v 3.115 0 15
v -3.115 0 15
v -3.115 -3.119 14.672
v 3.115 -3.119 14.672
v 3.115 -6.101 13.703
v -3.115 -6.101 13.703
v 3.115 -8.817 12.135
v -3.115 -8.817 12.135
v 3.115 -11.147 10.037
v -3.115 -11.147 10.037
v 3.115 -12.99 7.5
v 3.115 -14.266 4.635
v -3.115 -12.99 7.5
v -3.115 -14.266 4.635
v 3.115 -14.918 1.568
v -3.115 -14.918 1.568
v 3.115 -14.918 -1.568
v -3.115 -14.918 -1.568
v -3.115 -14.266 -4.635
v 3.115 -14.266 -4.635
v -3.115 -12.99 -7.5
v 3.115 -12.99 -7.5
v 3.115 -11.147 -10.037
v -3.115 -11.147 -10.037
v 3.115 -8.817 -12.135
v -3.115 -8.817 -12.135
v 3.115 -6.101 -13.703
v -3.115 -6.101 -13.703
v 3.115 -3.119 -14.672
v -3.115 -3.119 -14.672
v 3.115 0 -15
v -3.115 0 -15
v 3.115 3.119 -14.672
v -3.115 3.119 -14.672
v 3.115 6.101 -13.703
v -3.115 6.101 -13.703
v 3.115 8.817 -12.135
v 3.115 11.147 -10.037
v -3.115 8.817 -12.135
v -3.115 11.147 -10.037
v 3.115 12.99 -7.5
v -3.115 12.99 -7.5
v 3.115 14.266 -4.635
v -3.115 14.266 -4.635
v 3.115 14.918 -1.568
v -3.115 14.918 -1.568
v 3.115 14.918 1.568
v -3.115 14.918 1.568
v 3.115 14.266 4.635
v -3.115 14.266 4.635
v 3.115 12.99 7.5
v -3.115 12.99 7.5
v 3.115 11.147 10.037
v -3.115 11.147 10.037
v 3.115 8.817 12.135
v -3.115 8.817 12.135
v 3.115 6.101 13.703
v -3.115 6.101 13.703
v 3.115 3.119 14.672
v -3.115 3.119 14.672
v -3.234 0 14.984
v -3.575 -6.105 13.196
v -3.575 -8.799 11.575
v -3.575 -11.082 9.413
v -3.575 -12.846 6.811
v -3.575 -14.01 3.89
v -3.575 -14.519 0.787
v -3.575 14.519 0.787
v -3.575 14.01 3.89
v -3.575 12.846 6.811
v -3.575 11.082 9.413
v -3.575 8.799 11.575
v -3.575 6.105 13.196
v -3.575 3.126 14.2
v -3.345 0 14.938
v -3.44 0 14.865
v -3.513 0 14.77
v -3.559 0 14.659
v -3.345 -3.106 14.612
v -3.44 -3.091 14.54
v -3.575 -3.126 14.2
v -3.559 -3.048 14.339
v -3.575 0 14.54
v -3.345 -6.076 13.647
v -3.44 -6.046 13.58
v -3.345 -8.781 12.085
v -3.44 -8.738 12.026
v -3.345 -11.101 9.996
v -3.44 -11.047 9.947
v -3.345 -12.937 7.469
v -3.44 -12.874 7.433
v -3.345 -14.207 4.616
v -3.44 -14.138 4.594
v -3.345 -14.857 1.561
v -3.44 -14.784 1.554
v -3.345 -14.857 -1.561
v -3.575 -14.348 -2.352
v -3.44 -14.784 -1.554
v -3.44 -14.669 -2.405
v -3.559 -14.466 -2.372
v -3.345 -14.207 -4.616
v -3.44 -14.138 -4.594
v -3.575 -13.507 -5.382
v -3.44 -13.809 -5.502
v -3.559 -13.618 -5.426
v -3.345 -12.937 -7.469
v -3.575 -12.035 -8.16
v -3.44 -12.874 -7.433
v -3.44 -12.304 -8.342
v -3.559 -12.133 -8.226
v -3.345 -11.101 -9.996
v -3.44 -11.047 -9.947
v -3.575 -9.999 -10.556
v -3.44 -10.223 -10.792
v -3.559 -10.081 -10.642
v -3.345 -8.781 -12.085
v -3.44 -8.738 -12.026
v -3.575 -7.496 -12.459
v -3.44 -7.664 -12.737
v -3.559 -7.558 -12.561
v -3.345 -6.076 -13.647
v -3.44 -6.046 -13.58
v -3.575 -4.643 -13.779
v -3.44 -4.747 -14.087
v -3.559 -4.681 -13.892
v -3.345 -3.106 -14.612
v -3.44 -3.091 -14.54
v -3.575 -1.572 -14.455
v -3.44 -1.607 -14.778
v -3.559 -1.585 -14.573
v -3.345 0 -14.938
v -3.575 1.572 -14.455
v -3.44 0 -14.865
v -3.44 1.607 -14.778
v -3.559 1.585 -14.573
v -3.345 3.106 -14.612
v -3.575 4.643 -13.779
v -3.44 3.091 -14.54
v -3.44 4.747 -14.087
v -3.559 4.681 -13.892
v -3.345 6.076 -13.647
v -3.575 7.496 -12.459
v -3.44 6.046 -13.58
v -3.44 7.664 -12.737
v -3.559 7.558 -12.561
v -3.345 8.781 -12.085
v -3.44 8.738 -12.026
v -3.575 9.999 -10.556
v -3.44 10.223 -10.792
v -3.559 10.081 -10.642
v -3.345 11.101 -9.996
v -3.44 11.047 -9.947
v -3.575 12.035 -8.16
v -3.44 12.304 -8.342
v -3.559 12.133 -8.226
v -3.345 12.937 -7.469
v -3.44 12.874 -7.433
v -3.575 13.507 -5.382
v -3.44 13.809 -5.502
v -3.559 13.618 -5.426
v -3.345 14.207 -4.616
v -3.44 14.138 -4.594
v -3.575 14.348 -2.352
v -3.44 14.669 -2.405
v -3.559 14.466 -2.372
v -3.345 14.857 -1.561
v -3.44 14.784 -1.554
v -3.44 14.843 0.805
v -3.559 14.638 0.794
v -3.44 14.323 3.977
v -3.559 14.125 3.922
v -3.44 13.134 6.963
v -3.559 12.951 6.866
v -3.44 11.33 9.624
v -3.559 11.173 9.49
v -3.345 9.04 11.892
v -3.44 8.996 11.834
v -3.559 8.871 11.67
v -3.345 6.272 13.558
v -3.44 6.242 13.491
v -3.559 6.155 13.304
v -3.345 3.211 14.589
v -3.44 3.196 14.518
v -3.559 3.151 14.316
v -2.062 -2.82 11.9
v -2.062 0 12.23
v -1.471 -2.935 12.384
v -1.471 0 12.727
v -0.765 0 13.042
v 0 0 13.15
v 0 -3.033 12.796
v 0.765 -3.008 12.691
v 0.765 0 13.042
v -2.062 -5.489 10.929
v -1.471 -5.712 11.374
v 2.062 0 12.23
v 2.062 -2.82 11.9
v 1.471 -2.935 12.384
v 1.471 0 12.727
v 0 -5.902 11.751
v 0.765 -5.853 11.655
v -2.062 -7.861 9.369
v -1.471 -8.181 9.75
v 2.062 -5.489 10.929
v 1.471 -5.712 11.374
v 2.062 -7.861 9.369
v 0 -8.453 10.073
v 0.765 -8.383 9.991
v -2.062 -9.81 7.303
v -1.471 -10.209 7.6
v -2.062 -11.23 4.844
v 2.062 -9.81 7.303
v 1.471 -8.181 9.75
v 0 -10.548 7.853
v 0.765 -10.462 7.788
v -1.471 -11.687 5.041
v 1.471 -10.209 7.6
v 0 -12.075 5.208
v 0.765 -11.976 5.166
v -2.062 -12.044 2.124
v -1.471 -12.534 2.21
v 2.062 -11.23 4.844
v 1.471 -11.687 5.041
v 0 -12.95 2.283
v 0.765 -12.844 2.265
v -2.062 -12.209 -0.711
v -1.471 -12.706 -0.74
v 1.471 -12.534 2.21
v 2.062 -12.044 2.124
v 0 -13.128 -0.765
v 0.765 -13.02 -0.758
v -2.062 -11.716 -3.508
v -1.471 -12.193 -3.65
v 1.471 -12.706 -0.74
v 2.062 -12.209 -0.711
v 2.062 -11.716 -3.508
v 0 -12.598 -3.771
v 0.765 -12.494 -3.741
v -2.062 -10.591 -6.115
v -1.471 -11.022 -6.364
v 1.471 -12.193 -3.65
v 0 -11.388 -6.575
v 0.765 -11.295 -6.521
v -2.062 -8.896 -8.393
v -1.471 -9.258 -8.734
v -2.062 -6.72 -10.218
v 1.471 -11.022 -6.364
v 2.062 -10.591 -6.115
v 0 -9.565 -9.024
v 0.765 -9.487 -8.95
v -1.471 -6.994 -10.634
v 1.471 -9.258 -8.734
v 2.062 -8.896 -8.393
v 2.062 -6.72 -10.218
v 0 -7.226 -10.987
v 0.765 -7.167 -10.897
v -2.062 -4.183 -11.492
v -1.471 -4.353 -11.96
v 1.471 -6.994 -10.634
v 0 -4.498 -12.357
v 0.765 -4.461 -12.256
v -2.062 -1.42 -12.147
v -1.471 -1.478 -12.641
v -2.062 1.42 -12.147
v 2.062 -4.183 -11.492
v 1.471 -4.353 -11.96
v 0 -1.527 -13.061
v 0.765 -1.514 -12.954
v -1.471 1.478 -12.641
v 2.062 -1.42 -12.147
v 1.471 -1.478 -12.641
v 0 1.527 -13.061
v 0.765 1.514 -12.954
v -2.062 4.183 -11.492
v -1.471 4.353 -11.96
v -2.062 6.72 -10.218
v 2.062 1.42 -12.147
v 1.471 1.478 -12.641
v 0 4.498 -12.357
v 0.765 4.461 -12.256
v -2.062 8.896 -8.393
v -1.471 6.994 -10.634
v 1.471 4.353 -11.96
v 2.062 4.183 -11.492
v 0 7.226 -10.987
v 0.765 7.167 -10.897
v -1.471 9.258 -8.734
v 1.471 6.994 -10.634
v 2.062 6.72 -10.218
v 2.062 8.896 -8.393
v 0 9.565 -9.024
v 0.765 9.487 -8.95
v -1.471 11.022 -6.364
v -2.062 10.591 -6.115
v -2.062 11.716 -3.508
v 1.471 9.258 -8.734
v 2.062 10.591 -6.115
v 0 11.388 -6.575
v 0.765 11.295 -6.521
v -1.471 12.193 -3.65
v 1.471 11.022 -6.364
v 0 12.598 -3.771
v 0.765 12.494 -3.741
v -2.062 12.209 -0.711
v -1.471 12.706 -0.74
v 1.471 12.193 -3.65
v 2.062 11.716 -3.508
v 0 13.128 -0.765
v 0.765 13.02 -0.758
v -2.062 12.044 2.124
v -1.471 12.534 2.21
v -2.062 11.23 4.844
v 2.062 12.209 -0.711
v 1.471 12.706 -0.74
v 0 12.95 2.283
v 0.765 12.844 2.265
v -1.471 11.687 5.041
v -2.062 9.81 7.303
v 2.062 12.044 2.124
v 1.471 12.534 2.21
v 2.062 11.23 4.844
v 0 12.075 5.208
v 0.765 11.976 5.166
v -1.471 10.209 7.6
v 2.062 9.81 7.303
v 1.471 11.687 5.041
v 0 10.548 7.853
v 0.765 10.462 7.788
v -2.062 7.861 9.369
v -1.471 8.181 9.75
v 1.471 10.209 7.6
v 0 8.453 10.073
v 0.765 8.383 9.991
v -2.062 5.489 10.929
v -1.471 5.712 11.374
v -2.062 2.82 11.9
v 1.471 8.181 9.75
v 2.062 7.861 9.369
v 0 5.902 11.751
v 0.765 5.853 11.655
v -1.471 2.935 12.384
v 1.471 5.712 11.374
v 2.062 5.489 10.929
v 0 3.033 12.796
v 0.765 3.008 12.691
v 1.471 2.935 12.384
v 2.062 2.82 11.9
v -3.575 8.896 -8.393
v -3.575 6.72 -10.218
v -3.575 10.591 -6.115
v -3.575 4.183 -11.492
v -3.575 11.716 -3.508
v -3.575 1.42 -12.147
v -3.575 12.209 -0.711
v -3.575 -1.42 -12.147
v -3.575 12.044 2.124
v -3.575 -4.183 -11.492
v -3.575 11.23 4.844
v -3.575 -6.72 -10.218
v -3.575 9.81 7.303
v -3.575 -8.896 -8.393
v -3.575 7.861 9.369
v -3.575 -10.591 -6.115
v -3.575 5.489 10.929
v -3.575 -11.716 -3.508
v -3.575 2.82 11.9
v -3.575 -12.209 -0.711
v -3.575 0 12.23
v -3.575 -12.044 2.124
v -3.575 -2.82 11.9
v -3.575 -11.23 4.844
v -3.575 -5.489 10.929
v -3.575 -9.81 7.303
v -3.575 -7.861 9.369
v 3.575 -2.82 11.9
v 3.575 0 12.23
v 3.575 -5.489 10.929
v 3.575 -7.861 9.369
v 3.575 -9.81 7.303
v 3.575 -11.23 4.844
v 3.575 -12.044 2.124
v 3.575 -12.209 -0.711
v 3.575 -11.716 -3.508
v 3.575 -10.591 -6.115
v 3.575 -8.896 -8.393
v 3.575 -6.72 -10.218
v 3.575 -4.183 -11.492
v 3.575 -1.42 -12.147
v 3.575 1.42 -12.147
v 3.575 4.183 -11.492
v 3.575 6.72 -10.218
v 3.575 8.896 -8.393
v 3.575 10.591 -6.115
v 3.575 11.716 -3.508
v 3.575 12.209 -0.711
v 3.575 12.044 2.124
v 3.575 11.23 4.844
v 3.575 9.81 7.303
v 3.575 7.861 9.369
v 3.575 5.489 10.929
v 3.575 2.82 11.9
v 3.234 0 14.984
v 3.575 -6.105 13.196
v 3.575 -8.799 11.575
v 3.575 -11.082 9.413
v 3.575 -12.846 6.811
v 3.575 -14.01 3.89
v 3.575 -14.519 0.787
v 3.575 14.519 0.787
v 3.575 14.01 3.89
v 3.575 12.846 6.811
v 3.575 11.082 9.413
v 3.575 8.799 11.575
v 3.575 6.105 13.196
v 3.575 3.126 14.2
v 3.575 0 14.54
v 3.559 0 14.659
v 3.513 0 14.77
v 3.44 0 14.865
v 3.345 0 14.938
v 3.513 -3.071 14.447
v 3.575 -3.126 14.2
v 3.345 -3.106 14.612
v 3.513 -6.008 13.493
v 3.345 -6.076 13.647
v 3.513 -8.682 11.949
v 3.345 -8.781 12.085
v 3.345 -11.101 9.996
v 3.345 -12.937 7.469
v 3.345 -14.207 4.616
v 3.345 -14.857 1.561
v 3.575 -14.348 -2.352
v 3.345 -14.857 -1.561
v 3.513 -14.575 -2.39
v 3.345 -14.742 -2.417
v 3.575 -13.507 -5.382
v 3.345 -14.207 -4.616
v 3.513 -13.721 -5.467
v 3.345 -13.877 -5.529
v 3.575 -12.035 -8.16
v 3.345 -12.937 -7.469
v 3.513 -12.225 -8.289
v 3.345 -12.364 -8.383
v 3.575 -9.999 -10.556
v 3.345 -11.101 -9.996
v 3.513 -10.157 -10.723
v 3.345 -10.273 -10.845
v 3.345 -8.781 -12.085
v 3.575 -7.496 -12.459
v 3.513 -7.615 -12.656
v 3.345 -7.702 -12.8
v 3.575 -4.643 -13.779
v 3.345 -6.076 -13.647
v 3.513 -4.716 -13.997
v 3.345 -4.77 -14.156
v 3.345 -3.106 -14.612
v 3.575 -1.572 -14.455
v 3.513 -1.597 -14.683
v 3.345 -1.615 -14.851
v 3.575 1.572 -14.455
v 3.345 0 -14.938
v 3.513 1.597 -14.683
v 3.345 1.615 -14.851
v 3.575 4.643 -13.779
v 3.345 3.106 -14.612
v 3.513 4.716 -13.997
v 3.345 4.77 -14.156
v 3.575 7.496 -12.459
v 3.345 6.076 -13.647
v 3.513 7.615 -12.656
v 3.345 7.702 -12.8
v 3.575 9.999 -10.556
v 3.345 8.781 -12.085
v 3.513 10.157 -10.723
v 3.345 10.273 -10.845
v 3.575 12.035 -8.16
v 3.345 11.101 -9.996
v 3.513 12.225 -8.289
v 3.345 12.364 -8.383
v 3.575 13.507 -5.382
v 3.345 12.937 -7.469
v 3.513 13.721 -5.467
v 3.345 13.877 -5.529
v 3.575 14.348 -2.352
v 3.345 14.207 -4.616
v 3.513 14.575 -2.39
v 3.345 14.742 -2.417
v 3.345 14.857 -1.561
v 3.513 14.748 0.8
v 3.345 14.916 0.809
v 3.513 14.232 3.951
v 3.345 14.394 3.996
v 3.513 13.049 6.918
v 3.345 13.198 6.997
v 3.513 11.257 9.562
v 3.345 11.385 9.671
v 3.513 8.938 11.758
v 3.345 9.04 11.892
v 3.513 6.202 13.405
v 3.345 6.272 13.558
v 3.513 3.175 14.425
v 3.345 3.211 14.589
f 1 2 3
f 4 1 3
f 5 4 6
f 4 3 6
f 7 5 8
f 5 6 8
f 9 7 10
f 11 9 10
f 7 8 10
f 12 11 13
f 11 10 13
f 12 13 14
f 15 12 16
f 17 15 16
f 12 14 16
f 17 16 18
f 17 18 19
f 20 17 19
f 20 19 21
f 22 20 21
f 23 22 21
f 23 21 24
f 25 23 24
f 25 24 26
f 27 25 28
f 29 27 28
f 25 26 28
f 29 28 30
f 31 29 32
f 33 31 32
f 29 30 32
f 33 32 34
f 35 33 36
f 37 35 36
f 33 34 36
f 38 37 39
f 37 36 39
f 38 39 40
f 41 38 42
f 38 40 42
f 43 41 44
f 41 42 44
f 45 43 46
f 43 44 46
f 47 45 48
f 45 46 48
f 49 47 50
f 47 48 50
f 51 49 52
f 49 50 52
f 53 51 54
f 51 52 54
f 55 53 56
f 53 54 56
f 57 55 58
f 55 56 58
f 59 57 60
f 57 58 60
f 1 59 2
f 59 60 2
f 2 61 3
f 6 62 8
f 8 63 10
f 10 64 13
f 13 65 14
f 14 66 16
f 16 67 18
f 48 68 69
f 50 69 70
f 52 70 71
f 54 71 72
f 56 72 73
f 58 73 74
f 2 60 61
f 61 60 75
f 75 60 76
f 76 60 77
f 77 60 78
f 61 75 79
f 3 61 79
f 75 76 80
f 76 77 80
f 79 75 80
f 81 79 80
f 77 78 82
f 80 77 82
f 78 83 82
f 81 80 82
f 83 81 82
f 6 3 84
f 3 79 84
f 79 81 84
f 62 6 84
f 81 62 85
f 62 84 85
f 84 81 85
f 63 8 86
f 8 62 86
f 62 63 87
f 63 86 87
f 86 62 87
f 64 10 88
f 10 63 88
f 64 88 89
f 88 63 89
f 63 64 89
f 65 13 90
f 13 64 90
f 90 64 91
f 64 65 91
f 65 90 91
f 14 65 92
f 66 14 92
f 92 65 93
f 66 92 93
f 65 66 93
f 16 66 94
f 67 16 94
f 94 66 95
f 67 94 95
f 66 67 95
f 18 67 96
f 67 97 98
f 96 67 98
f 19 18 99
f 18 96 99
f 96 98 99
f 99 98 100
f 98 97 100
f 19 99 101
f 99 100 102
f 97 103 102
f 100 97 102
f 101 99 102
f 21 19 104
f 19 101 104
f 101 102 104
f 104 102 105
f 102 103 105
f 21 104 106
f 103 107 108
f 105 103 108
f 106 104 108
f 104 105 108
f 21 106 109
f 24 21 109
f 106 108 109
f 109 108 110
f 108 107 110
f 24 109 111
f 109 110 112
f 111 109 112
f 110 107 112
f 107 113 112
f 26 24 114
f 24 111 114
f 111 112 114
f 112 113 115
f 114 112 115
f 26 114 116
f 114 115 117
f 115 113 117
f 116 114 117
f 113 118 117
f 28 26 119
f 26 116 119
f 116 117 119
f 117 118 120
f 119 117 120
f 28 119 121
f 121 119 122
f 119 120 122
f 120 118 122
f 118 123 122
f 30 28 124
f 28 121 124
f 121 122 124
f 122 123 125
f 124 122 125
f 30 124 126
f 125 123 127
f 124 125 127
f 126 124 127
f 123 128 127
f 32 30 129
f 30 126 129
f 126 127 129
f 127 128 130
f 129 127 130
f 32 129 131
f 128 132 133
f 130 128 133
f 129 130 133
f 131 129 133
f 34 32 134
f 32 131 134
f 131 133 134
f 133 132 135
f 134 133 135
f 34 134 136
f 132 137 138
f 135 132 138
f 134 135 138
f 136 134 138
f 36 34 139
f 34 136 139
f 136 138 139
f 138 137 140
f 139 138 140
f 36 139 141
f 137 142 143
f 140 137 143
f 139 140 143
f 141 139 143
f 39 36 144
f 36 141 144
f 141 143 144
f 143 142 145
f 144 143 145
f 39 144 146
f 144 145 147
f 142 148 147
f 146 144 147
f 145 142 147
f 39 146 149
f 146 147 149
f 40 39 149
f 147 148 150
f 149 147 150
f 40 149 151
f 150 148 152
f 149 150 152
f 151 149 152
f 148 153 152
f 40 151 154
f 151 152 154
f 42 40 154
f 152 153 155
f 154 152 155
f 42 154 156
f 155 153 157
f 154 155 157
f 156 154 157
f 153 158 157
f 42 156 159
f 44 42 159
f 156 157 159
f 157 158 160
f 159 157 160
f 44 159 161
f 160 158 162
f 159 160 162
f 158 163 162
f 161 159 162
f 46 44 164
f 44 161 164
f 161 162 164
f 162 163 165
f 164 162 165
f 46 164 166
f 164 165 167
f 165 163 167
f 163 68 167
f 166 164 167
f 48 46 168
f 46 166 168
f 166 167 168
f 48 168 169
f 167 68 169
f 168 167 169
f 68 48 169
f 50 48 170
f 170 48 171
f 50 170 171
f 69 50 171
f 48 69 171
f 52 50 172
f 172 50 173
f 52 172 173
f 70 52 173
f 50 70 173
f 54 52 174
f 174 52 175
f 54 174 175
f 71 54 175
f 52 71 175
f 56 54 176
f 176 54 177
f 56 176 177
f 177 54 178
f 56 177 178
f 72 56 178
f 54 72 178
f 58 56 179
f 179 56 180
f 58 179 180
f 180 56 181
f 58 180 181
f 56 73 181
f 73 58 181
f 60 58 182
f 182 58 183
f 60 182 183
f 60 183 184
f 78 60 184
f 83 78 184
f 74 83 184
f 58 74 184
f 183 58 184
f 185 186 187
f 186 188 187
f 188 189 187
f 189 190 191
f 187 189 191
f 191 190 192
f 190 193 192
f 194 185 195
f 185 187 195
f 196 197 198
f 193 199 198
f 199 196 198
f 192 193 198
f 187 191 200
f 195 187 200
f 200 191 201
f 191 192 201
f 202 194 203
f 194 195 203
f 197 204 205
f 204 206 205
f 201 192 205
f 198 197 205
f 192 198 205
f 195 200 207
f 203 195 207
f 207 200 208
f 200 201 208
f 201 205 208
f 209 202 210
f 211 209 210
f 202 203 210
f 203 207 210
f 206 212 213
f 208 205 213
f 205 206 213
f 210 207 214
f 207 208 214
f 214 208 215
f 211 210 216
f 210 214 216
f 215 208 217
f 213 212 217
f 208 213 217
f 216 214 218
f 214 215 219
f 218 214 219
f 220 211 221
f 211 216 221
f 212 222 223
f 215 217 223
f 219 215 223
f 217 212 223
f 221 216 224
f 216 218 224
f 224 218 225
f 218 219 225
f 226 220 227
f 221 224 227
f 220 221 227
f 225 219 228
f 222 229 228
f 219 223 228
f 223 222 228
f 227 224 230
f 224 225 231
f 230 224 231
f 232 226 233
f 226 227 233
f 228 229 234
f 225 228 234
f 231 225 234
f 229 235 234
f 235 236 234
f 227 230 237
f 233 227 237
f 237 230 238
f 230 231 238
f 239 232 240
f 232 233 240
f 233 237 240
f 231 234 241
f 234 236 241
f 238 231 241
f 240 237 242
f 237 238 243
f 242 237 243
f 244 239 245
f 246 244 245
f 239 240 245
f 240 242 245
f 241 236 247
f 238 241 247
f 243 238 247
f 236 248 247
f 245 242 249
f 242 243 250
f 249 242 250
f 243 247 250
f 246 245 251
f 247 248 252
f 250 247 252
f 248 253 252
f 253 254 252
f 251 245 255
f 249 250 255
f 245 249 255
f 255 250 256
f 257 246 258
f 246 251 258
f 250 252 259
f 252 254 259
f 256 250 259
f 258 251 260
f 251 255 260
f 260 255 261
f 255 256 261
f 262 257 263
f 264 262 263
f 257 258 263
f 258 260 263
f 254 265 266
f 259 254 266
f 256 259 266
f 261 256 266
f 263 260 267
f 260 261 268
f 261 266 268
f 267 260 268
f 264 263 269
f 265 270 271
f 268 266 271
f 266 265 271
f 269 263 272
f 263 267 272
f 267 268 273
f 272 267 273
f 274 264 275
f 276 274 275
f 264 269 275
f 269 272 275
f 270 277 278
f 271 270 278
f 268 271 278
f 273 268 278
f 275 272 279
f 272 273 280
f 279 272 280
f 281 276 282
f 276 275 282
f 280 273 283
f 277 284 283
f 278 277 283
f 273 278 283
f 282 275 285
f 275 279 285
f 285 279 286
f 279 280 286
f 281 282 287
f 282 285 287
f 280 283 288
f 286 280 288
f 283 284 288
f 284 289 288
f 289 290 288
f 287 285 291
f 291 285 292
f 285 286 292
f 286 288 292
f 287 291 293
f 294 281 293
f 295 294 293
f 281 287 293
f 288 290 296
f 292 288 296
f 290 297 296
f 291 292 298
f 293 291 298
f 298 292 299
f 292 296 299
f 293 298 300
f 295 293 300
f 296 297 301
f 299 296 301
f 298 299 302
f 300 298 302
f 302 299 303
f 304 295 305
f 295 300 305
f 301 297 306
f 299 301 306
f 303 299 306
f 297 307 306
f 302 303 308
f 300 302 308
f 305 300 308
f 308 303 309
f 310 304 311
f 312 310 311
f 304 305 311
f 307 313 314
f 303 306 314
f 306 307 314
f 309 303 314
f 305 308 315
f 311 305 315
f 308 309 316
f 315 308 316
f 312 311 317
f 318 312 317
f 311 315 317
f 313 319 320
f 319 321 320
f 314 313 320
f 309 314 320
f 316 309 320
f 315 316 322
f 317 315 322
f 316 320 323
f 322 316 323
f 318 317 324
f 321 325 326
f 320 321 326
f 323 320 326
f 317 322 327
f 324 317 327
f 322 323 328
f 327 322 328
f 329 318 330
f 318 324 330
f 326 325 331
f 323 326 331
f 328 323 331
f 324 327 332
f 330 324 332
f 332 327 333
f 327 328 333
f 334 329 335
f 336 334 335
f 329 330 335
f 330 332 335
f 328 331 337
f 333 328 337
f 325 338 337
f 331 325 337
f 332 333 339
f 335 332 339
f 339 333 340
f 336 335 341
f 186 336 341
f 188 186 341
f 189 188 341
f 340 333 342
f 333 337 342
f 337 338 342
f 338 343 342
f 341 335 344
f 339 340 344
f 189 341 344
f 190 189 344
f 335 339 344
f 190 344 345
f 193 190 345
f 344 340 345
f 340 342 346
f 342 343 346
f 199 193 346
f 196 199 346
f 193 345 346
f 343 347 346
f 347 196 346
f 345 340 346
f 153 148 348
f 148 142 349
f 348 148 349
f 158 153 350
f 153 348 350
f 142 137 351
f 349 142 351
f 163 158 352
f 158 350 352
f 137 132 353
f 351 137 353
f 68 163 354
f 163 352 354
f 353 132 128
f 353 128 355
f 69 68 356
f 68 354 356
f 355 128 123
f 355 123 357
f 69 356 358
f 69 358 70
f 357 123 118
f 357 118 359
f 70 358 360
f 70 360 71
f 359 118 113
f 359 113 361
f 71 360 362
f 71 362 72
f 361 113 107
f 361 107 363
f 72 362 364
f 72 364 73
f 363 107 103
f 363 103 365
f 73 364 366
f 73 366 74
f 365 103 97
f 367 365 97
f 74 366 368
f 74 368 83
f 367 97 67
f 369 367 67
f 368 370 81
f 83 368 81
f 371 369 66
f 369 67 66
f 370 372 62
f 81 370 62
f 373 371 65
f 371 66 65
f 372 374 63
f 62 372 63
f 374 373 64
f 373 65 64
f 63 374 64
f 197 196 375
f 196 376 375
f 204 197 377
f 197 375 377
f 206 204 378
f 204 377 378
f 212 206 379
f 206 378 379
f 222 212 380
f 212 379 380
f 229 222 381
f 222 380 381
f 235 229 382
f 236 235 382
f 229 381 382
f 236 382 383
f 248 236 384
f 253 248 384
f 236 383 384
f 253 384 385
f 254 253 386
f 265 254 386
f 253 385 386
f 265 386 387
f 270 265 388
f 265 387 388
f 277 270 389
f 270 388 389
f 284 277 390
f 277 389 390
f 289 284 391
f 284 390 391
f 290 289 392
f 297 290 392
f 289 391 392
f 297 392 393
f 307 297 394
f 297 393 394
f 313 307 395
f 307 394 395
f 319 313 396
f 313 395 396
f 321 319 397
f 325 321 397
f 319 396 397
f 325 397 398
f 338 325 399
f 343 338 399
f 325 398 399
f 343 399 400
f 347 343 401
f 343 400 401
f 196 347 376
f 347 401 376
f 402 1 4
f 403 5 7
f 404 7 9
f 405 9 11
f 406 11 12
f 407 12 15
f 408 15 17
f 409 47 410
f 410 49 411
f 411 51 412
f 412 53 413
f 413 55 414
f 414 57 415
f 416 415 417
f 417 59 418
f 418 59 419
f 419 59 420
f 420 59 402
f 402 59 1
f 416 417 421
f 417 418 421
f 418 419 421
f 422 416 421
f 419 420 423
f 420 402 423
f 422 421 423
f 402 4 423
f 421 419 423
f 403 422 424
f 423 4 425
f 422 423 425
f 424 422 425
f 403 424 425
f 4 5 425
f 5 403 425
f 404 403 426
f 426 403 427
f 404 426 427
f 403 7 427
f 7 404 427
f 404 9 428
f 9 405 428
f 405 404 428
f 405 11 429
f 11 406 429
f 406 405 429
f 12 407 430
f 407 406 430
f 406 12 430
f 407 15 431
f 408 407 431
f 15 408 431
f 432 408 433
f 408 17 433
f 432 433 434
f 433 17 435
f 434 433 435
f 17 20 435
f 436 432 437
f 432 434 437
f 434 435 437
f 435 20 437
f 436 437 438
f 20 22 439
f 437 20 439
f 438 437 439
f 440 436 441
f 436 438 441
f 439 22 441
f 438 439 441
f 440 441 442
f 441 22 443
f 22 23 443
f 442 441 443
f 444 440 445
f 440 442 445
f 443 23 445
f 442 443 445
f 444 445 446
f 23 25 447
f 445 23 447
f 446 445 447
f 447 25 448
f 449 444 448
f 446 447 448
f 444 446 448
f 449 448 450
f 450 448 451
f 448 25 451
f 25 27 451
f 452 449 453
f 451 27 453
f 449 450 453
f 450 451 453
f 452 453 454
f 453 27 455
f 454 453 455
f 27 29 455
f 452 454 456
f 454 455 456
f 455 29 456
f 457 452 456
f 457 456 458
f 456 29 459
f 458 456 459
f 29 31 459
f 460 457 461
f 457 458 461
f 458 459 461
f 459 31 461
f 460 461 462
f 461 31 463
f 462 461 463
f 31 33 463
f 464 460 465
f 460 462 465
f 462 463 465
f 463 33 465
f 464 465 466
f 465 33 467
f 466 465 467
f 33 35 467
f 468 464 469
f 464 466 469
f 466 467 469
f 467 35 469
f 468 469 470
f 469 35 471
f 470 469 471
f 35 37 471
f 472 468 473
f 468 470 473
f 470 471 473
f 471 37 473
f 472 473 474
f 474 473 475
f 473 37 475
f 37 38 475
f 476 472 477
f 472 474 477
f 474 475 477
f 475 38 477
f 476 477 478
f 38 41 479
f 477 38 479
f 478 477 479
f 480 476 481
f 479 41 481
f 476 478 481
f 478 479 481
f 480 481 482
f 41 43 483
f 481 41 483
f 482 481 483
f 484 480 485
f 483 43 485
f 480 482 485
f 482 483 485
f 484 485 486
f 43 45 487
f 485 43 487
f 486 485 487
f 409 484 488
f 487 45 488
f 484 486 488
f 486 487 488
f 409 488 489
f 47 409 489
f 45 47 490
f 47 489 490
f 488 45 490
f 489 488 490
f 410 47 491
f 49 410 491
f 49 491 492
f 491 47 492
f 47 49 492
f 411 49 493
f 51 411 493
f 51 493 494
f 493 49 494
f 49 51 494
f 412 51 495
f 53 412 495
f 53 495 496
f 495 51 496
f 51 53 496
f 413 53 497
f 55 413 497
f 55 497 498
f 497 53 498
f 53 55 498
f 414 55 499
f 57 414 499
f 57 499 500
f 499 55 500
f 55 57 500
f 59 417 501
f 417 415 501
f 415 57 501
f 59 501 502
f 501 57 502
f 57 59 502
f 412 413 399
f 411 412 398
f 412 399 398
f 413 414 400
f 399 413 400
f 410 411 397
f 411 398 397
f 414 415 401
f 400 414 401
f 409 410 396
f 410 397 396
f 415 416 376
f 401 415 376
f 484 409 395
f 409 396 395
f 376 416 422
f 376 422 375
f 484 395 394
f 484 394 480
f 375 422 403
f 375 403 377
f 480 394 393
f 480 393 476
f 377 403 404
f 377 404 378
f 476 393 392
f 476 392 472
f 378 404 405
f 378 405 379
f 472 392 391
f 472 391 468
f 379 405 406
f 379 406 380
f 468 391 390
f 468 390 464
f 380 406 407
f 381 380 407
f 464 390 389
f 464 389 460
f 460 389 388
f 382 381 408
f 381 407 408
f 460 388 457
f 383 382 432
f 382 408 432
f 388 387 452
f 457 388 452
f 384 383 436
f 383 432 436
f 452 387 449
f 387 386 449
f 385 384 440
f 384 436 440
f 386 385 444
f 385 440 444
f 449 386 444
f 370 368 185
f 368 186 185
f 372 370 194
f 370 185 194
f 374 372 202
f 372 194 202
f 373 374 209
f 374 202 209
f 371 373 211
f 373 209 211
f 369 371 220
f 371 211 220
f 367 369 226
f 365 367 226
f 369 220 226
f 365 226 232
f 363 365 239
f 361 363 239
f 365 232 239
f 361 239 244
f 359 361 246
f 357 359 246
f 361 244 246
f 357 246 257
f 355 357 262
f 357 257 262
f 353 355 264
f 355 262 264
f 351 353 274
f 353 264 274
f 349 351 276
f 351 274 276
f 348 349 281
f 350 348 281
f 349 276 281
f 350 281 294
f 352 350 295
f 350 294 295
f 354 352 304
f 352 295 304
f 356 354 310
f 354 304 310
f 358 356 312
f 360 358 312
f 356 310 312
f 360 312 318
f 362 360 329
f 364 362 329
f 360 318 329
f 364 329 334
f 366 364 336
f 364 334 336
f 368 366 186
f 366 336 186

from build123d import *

# Parameters (mm, degrees)
FILLET_1_R = 0.46


with BuildPart() as part:
    # 草图1 → 旋转1 (revolve)
    with BuildSketch(Plane.XY, mode=Mode.PRIVATE) as revolve_1_sk:
        with BuildLine():
            Line((2.061649825, 12.23), (3.575, 12.23))
            Line((3.575, 12.23), (3.575, 15))
            Line((3.575, 15), (-3.575, 15))
            Line((-3.575, 15), (-3.575, 12.23))
            Line((-3.575, 12.23), (-2.061649825, 12.23))
            ThreePointArc((-2.061649825, 12.23), (0, 13.15), (2.061649825, 12.23))
        make_face()
    revolve(revolve_1_sk.sketch.rotate(Axis((0, 0, 0), (1, 0, 0)), 90), axis=Axis((0, 0, 0), (1, 0, 0)))

    # 圆角1
    fillet_1_edges = [part.edges().sort_by_distance(p)[0] for p in [
        (3.575, 0, -15),
        (-3.575, 0, -15),
    ]]
    fillet(fillet_1_edges, radius=FILLET_1_R)


solid = part.part
